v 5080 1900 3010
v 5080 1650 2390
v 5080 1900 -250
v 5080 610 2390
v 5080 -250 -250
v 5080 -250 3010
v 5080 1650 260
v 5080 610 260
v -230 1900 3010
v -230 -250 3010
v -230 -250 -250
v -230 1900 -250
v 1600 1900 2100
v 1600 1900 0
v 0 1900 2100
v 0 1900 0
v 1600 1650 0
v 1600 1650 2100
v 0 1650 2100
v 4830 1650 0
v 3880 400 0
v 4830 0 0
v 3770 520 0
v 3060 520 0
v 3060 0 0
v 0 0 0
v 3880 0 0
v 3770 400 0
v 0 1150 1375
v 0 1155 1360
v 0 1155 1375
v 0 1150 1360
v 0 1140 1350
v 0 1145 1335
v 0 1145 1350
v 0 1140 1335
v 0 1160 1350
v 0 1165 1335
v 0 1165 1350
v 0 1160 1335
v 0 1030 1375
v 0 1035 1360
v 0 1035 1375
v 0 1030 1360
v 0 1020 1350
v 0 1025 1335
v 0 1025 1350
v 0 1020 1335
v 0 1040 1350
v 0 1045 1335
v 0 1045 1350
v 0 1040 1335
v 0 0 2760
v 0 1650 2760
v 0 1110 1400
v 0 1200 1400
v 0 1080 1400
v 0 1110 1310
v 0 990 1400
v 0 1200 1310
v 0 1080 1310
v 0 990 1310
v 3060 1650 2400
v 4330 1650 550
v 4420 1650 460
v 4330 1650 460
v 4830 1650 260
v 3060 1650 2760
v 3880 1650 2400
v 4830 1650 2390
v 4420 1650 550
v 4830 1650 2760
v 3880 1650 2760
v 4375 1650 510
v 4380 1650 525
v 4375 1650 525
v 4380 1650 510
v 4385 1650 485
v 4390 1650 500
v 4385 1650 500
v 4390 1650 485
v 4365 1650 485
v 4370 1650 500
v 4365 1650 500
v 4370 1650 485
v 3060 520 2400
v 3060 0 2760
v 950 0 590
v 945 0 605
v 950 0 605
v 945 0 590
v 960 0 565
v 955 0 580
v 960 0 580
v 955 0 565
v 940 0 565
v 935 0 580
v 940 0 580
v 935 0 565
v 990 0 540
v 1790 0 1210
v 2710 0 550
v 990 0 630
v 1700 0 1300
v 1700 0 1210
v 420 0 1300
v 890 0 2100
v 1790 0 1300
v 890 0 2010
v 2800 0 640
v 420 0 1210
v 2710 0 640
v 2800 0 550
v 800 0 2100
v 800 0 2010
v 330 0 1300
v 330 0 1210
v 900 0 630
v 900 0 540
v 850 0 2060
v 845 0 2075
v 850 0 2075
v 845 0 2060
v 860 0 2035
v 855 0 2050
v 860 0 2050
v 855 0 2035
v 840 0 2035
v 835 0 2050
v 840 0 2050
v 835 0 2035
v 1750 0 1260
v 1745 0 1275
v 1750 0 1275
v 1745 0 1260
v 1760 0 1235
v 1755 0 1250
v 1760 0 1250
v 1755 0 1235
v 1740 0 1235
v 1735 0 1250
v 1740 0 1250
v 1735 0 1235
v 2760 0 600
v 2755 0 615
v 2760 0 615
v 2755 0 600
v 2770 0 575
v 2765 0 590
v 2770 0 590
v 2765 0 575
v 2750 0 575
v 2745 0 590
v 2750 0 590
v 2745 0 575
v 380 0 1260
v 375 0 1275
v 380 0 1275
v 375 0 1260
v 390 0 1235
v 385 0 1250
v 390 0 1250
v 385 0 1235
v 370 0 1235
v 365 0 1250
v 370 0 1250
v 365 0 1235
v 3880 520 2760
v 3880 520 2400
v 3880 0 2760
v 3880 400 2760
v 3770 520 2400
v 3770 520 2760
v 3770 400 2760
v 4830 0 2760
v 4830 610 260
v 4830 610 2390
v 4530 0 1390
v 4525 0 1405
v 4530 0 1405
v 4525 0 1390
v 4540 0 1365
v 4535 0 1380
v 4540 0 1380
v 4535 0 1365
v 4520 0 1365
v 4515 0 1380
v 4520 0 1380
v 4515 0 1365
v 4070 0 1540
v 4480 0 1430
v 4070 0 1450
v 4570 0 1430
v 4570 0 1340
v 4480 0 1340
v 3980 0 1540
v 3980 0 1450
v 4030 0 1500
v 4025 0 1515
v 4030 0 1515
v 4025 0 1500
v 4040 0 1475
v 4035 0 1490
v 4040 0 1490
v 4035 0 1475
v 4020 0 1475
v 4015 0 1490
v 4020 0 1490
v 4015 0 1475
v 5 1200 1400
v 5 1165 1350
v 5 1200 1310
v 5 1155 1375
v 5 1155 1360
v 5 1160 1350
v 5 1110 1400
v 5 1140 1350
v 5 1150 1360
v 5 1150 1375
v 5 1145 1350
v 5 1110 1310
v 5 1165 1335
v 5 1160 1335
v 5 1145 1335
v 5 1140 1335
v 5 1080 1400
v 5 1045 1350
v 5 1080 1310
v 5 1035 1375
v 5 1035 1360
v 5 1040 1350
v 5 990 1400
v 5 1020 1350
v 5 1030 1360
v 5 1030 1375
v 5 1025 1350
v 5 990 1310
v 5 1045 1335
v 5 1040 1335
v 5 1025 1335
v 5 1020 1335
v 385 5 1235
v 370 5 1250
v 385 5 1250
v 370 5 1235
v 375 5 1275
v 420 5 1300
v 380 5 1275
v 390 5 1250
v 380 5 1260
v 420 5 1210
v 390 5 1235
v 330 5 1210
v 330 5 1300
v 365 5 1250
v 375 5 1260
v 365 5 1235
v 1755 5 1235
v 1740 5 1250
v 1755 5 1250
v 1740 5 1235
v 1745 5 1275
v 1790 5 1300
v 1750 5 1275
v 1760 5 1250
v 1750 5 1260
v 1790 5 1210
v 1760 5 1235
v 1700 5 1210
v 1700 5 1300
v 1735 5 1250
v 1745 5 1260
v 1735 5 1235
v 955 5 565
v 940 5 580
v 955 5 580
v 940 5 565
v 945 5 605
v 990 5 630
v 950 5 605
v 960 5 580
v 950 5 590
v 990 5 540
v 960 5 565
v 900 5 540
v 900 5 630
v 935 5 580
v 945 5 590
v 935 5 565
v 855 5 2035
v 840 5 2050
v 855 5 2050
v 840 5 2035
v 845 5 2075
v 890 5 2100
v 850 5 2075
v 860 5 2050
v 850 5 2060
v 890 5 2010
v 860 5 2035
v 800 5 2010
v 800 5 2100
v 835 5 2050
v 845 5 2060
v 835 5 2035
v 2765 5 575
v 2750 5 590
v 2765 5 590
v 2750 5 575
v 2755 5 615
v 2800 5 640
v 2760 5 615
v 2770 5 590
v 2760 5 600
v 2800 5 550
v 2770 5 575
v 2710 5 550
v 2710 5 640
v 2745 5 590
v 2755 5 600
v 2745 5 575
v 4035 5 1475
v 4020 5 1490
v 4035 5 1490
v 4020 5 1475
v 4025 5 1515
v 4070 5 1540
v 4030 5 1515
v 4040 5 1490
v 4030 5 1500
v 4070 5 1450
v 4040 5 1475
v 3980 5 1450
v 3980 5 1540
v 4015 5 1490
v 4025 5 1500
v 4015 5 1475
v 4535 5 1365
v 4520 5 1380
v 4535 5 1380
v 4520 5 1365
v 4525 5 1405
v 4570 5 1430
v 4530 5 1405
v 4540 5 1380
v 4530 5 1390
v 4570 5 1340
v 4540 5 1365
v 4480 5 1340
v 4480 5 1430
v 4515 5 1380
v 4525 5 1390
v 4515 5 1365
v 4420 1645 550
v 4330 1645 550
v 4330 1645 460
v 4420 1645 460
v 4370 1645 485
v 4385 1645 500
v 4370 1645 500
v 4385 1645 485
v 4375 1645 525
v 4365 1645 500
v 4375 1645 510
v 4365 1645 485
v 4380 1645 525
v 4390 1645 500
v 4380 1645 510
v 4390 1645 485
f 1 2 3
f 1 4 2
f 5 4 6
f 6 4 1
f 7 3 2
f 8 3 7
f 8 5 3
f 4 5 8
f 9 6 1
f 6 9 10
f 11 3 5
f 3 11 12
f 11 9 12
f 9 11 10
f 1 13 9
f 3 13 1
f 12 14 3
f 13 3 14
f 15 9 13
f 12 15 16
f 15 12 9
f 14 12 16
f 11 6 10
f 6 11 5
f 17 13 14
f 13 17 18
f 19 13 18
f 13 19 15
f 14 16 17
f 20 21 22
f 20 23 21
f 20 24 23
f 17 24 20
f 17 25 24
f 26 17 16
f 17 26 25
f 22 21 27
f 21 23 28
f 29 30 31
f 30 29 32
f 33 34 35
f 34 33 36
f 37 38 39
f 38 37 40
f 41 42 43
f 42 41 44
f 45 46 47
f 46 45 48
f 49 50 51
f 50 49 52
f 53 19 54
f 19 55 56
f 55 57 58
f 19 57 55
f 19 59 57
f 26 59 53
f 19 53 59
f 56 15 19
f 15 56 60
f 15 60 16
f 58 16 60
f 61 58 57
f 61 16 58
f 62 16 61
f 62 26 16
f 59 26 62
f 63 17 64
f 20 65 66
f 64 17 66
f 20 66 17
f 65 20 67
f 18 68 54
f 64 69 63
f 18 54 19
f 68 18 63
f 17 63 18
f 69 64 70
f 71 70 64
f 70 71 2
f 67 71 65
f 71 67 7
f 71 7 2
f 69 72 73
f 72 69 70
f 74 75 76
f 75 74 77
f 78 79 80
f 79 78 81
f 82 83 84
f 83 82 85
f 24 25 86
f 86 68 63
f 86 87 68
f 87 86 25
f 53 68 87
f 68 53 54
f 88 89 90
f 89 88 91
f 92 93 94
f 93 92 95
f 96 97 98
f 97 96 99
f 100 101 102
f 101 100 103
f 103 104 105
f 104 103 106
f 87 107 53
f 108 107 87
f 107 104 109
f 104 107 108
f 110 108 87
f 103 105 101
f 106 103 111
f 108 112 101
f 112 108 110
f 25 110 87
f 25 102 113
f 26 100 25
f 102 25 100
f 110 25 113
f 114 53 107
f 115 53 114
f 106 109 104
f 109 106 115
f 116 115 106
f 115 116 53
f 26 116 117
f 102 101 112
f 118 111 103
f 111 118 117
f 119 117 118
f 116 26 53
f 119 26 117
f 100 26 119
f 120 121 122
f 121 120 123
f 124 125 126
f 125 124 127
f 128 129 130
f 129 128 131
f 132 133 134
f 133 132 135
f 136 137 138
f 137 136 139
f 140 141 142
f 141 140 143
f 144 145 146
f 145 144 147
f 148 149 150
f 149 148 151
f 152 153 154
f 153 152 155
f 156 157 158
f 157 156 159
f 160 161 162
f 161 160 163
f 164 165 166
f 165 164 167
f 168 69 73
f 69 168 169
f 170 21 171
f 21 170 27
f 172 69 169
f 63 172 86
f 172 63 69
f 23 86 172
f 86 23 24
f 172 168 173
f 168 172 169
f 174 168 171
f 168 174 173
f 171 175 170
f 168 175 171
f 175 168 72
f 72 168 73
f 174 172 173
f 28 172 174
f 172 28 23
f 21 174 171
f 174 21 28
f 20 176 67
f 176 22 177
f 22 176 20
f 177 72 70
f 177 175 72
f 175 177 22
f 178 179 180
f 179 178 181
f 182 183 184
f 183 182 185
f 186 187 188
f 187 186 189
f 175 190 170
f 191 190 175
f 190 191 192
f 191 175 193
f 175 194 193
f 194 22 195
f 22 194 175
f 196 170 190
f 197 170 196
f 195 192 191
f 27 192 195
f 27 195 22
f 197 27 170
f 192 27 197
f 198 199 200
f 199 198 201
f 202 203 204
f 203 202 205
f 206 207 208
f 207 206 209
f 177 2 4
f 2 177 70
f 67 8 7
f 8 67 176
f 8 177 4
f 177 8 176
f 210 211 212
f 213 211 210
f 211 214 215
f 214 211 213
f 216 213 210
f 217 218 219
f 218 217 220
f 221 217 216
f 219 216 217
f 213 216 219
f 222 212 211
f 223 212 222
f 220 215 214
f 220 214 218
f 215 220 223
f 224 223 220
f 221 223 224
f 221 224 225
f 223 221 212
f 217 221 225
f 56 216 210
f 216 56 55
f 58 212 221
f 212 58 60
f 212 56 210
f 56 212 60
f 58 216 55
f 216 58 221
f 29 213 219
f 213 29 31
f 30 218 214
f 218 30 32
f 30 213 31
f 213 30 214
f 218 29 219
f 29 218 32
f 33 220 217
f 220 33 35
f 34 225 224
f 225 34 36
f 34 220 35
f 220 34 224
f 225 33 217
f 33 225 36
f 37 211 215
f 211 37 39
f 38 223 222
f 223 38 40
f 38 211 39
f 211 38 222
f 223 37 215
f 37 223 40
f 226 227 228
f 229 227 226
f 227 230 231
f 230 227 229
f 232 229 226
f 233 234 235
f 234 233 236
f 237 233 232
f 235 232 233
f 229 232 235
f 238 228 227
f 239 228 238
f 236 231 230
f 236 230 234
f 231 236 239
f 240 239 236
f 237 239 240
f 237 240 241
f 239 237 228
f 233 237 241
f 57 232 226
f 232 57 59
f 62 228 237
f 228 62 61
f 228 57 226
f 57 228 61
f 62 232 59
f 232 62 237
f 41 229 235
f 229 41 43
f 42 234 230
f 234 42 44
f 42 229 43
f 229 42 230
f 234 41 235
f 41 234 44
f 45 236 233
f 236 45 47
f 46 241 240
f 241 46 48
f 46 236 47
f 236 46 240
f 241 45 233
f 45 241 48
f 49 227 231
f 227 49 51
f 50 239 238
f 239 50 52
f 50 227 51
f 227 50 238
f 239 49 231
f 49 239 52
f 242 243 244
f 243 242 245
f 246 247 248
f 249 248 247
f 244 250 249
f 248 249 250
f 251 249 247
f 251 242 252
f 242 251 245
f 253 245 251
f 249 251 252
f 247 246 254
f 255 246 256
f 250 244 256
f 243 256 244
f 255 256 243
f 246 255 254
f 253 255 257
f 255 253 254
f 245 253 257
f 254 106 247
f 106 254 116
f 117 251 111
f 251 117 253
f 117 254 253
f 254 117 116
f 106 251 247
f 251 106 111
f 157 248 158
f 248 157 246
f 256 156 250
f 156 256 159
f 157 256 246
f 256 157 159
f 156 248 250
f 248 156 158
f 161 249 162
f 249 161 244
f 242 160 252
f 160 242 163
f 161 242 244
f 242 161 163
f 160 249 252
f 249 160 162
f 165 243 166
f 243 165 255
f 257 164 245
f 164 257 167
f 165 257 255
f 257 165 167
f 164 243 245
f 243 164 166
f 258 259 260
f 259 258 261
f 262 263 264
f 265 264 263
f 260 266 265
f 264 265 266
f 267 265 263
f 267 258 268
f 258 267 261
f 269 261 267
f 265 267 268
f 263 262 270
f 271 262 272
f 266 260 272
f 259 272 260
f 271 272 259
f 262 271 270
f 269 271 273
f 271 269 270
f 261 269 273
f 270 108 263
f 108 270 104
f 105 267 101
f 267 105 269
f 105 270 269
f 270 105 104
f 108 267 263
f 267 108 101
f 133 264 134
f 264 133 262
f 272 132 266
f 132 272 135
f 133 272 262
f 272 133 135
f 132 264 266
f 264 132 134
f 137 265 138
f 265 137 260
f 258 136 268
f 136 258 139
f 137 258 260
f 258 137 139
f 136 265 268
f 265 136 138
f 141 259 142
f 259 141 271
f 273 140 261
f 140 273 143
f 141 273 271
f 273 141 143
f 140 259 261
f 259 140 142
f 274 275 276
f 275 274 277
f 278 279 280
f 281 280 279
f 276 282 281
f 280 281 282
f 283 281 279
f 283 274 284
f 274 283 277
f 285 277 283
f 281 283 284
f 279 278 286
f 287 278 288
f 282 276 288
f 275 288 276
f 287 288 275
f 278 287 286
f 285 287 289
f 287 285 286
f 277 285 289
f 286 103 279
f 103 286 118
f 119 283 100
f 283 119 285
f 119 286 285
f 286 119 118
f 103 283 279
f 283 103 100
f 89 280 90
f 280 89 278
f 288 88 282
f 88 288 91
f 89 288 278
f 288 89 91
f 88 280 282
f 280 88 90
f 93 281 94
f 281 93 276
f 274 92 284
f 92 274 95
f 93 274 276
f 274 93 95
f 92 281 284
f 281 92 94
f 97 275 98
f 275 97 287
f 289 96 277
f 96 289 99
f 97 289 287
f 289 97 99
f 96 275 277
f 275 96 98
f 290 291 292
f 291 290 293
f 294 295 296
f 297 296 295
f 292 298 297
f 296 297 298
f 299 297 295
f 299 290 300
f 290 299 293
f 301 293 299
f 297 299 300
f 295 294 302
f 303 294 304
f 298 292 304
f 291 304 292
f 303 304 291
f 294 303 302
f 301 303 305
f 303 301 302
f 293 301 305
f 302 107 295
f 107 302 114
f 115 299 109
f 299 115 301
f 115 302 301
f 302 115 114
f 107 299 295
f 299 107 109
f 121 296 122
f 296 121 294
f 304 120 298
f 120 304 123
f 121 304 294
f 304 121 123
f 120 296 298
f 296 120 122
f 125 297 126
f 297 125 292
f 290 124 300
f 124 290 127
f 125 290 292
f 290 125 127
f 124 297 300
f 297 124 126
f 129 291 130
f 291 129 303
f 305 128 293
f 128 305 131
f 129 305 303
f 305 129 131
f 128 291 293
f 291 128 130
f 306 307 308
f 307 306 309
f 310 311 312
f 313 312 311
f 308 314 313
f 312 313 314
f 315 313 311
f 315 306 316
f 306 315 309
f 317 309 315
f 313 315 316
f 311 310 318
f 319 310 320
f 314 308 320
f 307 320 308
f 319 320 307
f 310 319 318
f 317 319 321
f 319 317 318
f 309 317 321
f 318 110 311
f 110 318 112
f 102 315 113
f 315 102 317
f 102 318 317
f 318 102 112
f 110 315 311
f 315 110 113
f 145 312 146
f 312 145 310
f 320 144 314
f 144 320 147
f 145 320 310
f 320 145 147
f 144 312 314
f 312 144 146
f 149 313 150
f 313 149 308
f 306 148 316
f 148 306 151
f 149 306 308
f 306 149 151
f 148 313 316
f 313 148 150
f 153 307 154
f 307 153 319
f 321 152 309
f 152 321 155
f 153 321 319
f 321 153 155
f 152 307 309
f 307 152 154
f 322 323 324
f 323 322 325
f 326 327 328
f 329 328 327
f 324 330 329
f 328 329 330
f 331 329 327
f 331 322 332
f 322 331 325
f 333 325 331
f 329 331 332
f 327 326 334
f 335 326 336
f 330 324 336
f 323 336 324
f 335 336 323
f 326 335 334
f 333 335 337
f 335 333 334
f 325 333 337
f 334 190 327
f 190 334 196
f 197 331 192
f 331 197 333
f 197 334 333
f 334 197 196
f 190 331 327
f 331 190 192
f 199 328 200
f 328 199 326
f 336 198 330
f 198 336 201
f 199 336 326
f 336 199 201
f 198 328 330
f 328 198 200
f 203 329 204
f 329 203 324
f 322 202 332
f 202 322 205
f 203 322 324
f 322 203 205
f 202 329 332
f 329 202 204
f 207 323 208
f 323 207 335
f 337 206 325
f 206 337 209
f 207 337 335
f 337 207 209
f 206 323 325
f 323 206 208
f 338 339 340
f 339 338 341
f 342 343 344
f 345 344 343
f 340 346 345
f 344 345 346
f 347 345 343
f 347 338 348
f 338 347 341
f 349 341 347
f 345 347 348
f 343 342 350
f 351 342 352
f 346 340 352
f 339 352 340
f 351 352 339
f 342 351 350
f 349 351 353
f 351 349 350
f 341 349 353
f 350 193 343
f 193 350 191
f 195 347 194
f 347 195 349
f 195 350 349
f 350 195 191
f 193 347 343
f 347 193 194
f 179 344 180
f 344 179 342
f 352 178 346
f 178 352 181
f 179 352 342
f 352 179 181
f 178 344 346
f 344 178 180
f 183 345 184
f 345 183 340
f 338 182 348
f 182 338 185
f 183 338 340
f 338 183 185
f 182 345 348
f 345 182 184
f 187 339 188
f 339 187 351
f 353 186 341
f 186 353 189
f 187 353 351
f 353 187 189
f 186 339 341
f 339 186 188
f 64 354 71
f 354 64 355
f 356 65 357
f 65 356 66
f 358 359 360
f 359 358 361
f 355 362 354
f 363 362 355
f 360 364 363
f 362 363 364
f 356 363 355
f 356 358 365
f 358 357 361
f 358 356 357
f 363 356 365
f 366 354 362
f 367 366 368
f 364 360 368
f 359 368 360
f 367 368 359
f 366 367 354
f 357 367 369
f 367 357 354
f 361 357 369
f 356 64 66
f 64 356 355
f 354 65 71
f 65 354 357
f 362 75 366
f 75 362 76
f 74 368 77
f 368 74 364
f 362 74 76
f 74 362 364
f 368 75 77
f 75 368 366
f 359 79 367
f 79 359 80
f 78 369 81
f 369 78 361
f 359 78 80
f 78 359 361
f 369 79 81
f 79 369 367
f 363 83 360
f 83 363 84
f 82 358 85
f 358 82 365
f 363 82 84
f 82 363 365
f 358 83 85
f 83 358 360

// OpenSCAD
// file: parts.scad
//插座示意图
module socket()
{
difference(){
cube([5,90,90]);
translate([0,40,50])
cube([5,5,15]);
translate([0,30,25])
cube([5,5,15]);
translate([0,50,25])
cube([5,5,15]);
}
}
//定义4个方向插座,都以右上角对准原点
module left_socket(){
translate([0,-90,-90])
socket();
}
module right_socket(){
translate([-5,90,0])
left_socket();
}
module up_socket(){
rotate(90,[0,0,1])
right_socket();
}

module down_socket(){
translate([90,5,0])
up_socket();
}

//开关示意图
module switch()
{
difference(){
cube([5,90,90]);
translate([0,20,20])
cube([5,45,45]);
}

}

//定义4个方向的开关,都以开关右上角对准原点
module left_switch(){
translate([0,-90,-90])
switch();
}

module right_switch(){
translate([-5,0,-90])
switch();
}

module down_switch(){
translate([90,0,-90])
rotate(90,[0,0,1])
switch();
}

module up_switch(){
translate([-90,0,-90])
rotate(90,[0,0,-1])
switch();
}
//吸顶灯示意图
module light(){
translate([0,0,-50])
cylinder(50,80,110,center);
}
//x方向墙半径r,深deep的空洞模型
module xhole(r,deep){
rotate(90,[0,1,0])
cylinder(deep,r,r,center);
}
//xhole(30,100);
//light();
module right_bathlight(){
translate([-35,0,0])
union(){
sphere(25);
translate([15,0,0])
rotate(90,[0,1,0])
cylinder(25,12,12,center);
}
}
module down_bathlight(){
rotate(90,[0,0,-1])
right_bathlight();
}


module alert_box(){
translate([-5,0,-90])
difference(){
cube([5,90,90]);

rotate(90,[0,1,0])
translate([-45,45,0])
cylinder(6,10,10,center);

}

}
alert_box();
// main file
use <parts.scad>
module kitchen(){
union(){
difference(){
translate([-230,-250,-250])
cube([230+3060+820+950+250,250+1650+250,2760+250+250]);

//厨房推拉门
translate([0,1650,0])
cube([1600,250,2100]);

// 厨房空间
cube([3060,1650,2760]);
//烟道旁空间
translate([3060,520,0])
cube([820,1130,2400]);

//烟道小缺口
translate([3060+820-110,400,0])
cube([110,120,2760]);
//生活阳台空间
translate([3060+820,0,0])
cube([950,1650,2760]);
// 生活阳台窗
translate([1600+3230,610,260])
cube([250,1040,2130]);
}
//厨房插座
translate([0,1650-450,1400])
left_socket();
translate([0,1650-570,1400])
left_socket();
translate([330,0,1300])
down_socket();
translate([1700,0,1300])
down_socket();
translate([900,0,630])
down_socket();
translate([800,0,2100])
down_socket();
translate([3060-350,0,640])
down_socket();
translate([3060+820+100,0,1540])
down_socket();
translate([3060+820+600,0,1430])
down_socket();
translate([3060+820+950-410,1650,550])
up_socket();



}




}


kitchen();
